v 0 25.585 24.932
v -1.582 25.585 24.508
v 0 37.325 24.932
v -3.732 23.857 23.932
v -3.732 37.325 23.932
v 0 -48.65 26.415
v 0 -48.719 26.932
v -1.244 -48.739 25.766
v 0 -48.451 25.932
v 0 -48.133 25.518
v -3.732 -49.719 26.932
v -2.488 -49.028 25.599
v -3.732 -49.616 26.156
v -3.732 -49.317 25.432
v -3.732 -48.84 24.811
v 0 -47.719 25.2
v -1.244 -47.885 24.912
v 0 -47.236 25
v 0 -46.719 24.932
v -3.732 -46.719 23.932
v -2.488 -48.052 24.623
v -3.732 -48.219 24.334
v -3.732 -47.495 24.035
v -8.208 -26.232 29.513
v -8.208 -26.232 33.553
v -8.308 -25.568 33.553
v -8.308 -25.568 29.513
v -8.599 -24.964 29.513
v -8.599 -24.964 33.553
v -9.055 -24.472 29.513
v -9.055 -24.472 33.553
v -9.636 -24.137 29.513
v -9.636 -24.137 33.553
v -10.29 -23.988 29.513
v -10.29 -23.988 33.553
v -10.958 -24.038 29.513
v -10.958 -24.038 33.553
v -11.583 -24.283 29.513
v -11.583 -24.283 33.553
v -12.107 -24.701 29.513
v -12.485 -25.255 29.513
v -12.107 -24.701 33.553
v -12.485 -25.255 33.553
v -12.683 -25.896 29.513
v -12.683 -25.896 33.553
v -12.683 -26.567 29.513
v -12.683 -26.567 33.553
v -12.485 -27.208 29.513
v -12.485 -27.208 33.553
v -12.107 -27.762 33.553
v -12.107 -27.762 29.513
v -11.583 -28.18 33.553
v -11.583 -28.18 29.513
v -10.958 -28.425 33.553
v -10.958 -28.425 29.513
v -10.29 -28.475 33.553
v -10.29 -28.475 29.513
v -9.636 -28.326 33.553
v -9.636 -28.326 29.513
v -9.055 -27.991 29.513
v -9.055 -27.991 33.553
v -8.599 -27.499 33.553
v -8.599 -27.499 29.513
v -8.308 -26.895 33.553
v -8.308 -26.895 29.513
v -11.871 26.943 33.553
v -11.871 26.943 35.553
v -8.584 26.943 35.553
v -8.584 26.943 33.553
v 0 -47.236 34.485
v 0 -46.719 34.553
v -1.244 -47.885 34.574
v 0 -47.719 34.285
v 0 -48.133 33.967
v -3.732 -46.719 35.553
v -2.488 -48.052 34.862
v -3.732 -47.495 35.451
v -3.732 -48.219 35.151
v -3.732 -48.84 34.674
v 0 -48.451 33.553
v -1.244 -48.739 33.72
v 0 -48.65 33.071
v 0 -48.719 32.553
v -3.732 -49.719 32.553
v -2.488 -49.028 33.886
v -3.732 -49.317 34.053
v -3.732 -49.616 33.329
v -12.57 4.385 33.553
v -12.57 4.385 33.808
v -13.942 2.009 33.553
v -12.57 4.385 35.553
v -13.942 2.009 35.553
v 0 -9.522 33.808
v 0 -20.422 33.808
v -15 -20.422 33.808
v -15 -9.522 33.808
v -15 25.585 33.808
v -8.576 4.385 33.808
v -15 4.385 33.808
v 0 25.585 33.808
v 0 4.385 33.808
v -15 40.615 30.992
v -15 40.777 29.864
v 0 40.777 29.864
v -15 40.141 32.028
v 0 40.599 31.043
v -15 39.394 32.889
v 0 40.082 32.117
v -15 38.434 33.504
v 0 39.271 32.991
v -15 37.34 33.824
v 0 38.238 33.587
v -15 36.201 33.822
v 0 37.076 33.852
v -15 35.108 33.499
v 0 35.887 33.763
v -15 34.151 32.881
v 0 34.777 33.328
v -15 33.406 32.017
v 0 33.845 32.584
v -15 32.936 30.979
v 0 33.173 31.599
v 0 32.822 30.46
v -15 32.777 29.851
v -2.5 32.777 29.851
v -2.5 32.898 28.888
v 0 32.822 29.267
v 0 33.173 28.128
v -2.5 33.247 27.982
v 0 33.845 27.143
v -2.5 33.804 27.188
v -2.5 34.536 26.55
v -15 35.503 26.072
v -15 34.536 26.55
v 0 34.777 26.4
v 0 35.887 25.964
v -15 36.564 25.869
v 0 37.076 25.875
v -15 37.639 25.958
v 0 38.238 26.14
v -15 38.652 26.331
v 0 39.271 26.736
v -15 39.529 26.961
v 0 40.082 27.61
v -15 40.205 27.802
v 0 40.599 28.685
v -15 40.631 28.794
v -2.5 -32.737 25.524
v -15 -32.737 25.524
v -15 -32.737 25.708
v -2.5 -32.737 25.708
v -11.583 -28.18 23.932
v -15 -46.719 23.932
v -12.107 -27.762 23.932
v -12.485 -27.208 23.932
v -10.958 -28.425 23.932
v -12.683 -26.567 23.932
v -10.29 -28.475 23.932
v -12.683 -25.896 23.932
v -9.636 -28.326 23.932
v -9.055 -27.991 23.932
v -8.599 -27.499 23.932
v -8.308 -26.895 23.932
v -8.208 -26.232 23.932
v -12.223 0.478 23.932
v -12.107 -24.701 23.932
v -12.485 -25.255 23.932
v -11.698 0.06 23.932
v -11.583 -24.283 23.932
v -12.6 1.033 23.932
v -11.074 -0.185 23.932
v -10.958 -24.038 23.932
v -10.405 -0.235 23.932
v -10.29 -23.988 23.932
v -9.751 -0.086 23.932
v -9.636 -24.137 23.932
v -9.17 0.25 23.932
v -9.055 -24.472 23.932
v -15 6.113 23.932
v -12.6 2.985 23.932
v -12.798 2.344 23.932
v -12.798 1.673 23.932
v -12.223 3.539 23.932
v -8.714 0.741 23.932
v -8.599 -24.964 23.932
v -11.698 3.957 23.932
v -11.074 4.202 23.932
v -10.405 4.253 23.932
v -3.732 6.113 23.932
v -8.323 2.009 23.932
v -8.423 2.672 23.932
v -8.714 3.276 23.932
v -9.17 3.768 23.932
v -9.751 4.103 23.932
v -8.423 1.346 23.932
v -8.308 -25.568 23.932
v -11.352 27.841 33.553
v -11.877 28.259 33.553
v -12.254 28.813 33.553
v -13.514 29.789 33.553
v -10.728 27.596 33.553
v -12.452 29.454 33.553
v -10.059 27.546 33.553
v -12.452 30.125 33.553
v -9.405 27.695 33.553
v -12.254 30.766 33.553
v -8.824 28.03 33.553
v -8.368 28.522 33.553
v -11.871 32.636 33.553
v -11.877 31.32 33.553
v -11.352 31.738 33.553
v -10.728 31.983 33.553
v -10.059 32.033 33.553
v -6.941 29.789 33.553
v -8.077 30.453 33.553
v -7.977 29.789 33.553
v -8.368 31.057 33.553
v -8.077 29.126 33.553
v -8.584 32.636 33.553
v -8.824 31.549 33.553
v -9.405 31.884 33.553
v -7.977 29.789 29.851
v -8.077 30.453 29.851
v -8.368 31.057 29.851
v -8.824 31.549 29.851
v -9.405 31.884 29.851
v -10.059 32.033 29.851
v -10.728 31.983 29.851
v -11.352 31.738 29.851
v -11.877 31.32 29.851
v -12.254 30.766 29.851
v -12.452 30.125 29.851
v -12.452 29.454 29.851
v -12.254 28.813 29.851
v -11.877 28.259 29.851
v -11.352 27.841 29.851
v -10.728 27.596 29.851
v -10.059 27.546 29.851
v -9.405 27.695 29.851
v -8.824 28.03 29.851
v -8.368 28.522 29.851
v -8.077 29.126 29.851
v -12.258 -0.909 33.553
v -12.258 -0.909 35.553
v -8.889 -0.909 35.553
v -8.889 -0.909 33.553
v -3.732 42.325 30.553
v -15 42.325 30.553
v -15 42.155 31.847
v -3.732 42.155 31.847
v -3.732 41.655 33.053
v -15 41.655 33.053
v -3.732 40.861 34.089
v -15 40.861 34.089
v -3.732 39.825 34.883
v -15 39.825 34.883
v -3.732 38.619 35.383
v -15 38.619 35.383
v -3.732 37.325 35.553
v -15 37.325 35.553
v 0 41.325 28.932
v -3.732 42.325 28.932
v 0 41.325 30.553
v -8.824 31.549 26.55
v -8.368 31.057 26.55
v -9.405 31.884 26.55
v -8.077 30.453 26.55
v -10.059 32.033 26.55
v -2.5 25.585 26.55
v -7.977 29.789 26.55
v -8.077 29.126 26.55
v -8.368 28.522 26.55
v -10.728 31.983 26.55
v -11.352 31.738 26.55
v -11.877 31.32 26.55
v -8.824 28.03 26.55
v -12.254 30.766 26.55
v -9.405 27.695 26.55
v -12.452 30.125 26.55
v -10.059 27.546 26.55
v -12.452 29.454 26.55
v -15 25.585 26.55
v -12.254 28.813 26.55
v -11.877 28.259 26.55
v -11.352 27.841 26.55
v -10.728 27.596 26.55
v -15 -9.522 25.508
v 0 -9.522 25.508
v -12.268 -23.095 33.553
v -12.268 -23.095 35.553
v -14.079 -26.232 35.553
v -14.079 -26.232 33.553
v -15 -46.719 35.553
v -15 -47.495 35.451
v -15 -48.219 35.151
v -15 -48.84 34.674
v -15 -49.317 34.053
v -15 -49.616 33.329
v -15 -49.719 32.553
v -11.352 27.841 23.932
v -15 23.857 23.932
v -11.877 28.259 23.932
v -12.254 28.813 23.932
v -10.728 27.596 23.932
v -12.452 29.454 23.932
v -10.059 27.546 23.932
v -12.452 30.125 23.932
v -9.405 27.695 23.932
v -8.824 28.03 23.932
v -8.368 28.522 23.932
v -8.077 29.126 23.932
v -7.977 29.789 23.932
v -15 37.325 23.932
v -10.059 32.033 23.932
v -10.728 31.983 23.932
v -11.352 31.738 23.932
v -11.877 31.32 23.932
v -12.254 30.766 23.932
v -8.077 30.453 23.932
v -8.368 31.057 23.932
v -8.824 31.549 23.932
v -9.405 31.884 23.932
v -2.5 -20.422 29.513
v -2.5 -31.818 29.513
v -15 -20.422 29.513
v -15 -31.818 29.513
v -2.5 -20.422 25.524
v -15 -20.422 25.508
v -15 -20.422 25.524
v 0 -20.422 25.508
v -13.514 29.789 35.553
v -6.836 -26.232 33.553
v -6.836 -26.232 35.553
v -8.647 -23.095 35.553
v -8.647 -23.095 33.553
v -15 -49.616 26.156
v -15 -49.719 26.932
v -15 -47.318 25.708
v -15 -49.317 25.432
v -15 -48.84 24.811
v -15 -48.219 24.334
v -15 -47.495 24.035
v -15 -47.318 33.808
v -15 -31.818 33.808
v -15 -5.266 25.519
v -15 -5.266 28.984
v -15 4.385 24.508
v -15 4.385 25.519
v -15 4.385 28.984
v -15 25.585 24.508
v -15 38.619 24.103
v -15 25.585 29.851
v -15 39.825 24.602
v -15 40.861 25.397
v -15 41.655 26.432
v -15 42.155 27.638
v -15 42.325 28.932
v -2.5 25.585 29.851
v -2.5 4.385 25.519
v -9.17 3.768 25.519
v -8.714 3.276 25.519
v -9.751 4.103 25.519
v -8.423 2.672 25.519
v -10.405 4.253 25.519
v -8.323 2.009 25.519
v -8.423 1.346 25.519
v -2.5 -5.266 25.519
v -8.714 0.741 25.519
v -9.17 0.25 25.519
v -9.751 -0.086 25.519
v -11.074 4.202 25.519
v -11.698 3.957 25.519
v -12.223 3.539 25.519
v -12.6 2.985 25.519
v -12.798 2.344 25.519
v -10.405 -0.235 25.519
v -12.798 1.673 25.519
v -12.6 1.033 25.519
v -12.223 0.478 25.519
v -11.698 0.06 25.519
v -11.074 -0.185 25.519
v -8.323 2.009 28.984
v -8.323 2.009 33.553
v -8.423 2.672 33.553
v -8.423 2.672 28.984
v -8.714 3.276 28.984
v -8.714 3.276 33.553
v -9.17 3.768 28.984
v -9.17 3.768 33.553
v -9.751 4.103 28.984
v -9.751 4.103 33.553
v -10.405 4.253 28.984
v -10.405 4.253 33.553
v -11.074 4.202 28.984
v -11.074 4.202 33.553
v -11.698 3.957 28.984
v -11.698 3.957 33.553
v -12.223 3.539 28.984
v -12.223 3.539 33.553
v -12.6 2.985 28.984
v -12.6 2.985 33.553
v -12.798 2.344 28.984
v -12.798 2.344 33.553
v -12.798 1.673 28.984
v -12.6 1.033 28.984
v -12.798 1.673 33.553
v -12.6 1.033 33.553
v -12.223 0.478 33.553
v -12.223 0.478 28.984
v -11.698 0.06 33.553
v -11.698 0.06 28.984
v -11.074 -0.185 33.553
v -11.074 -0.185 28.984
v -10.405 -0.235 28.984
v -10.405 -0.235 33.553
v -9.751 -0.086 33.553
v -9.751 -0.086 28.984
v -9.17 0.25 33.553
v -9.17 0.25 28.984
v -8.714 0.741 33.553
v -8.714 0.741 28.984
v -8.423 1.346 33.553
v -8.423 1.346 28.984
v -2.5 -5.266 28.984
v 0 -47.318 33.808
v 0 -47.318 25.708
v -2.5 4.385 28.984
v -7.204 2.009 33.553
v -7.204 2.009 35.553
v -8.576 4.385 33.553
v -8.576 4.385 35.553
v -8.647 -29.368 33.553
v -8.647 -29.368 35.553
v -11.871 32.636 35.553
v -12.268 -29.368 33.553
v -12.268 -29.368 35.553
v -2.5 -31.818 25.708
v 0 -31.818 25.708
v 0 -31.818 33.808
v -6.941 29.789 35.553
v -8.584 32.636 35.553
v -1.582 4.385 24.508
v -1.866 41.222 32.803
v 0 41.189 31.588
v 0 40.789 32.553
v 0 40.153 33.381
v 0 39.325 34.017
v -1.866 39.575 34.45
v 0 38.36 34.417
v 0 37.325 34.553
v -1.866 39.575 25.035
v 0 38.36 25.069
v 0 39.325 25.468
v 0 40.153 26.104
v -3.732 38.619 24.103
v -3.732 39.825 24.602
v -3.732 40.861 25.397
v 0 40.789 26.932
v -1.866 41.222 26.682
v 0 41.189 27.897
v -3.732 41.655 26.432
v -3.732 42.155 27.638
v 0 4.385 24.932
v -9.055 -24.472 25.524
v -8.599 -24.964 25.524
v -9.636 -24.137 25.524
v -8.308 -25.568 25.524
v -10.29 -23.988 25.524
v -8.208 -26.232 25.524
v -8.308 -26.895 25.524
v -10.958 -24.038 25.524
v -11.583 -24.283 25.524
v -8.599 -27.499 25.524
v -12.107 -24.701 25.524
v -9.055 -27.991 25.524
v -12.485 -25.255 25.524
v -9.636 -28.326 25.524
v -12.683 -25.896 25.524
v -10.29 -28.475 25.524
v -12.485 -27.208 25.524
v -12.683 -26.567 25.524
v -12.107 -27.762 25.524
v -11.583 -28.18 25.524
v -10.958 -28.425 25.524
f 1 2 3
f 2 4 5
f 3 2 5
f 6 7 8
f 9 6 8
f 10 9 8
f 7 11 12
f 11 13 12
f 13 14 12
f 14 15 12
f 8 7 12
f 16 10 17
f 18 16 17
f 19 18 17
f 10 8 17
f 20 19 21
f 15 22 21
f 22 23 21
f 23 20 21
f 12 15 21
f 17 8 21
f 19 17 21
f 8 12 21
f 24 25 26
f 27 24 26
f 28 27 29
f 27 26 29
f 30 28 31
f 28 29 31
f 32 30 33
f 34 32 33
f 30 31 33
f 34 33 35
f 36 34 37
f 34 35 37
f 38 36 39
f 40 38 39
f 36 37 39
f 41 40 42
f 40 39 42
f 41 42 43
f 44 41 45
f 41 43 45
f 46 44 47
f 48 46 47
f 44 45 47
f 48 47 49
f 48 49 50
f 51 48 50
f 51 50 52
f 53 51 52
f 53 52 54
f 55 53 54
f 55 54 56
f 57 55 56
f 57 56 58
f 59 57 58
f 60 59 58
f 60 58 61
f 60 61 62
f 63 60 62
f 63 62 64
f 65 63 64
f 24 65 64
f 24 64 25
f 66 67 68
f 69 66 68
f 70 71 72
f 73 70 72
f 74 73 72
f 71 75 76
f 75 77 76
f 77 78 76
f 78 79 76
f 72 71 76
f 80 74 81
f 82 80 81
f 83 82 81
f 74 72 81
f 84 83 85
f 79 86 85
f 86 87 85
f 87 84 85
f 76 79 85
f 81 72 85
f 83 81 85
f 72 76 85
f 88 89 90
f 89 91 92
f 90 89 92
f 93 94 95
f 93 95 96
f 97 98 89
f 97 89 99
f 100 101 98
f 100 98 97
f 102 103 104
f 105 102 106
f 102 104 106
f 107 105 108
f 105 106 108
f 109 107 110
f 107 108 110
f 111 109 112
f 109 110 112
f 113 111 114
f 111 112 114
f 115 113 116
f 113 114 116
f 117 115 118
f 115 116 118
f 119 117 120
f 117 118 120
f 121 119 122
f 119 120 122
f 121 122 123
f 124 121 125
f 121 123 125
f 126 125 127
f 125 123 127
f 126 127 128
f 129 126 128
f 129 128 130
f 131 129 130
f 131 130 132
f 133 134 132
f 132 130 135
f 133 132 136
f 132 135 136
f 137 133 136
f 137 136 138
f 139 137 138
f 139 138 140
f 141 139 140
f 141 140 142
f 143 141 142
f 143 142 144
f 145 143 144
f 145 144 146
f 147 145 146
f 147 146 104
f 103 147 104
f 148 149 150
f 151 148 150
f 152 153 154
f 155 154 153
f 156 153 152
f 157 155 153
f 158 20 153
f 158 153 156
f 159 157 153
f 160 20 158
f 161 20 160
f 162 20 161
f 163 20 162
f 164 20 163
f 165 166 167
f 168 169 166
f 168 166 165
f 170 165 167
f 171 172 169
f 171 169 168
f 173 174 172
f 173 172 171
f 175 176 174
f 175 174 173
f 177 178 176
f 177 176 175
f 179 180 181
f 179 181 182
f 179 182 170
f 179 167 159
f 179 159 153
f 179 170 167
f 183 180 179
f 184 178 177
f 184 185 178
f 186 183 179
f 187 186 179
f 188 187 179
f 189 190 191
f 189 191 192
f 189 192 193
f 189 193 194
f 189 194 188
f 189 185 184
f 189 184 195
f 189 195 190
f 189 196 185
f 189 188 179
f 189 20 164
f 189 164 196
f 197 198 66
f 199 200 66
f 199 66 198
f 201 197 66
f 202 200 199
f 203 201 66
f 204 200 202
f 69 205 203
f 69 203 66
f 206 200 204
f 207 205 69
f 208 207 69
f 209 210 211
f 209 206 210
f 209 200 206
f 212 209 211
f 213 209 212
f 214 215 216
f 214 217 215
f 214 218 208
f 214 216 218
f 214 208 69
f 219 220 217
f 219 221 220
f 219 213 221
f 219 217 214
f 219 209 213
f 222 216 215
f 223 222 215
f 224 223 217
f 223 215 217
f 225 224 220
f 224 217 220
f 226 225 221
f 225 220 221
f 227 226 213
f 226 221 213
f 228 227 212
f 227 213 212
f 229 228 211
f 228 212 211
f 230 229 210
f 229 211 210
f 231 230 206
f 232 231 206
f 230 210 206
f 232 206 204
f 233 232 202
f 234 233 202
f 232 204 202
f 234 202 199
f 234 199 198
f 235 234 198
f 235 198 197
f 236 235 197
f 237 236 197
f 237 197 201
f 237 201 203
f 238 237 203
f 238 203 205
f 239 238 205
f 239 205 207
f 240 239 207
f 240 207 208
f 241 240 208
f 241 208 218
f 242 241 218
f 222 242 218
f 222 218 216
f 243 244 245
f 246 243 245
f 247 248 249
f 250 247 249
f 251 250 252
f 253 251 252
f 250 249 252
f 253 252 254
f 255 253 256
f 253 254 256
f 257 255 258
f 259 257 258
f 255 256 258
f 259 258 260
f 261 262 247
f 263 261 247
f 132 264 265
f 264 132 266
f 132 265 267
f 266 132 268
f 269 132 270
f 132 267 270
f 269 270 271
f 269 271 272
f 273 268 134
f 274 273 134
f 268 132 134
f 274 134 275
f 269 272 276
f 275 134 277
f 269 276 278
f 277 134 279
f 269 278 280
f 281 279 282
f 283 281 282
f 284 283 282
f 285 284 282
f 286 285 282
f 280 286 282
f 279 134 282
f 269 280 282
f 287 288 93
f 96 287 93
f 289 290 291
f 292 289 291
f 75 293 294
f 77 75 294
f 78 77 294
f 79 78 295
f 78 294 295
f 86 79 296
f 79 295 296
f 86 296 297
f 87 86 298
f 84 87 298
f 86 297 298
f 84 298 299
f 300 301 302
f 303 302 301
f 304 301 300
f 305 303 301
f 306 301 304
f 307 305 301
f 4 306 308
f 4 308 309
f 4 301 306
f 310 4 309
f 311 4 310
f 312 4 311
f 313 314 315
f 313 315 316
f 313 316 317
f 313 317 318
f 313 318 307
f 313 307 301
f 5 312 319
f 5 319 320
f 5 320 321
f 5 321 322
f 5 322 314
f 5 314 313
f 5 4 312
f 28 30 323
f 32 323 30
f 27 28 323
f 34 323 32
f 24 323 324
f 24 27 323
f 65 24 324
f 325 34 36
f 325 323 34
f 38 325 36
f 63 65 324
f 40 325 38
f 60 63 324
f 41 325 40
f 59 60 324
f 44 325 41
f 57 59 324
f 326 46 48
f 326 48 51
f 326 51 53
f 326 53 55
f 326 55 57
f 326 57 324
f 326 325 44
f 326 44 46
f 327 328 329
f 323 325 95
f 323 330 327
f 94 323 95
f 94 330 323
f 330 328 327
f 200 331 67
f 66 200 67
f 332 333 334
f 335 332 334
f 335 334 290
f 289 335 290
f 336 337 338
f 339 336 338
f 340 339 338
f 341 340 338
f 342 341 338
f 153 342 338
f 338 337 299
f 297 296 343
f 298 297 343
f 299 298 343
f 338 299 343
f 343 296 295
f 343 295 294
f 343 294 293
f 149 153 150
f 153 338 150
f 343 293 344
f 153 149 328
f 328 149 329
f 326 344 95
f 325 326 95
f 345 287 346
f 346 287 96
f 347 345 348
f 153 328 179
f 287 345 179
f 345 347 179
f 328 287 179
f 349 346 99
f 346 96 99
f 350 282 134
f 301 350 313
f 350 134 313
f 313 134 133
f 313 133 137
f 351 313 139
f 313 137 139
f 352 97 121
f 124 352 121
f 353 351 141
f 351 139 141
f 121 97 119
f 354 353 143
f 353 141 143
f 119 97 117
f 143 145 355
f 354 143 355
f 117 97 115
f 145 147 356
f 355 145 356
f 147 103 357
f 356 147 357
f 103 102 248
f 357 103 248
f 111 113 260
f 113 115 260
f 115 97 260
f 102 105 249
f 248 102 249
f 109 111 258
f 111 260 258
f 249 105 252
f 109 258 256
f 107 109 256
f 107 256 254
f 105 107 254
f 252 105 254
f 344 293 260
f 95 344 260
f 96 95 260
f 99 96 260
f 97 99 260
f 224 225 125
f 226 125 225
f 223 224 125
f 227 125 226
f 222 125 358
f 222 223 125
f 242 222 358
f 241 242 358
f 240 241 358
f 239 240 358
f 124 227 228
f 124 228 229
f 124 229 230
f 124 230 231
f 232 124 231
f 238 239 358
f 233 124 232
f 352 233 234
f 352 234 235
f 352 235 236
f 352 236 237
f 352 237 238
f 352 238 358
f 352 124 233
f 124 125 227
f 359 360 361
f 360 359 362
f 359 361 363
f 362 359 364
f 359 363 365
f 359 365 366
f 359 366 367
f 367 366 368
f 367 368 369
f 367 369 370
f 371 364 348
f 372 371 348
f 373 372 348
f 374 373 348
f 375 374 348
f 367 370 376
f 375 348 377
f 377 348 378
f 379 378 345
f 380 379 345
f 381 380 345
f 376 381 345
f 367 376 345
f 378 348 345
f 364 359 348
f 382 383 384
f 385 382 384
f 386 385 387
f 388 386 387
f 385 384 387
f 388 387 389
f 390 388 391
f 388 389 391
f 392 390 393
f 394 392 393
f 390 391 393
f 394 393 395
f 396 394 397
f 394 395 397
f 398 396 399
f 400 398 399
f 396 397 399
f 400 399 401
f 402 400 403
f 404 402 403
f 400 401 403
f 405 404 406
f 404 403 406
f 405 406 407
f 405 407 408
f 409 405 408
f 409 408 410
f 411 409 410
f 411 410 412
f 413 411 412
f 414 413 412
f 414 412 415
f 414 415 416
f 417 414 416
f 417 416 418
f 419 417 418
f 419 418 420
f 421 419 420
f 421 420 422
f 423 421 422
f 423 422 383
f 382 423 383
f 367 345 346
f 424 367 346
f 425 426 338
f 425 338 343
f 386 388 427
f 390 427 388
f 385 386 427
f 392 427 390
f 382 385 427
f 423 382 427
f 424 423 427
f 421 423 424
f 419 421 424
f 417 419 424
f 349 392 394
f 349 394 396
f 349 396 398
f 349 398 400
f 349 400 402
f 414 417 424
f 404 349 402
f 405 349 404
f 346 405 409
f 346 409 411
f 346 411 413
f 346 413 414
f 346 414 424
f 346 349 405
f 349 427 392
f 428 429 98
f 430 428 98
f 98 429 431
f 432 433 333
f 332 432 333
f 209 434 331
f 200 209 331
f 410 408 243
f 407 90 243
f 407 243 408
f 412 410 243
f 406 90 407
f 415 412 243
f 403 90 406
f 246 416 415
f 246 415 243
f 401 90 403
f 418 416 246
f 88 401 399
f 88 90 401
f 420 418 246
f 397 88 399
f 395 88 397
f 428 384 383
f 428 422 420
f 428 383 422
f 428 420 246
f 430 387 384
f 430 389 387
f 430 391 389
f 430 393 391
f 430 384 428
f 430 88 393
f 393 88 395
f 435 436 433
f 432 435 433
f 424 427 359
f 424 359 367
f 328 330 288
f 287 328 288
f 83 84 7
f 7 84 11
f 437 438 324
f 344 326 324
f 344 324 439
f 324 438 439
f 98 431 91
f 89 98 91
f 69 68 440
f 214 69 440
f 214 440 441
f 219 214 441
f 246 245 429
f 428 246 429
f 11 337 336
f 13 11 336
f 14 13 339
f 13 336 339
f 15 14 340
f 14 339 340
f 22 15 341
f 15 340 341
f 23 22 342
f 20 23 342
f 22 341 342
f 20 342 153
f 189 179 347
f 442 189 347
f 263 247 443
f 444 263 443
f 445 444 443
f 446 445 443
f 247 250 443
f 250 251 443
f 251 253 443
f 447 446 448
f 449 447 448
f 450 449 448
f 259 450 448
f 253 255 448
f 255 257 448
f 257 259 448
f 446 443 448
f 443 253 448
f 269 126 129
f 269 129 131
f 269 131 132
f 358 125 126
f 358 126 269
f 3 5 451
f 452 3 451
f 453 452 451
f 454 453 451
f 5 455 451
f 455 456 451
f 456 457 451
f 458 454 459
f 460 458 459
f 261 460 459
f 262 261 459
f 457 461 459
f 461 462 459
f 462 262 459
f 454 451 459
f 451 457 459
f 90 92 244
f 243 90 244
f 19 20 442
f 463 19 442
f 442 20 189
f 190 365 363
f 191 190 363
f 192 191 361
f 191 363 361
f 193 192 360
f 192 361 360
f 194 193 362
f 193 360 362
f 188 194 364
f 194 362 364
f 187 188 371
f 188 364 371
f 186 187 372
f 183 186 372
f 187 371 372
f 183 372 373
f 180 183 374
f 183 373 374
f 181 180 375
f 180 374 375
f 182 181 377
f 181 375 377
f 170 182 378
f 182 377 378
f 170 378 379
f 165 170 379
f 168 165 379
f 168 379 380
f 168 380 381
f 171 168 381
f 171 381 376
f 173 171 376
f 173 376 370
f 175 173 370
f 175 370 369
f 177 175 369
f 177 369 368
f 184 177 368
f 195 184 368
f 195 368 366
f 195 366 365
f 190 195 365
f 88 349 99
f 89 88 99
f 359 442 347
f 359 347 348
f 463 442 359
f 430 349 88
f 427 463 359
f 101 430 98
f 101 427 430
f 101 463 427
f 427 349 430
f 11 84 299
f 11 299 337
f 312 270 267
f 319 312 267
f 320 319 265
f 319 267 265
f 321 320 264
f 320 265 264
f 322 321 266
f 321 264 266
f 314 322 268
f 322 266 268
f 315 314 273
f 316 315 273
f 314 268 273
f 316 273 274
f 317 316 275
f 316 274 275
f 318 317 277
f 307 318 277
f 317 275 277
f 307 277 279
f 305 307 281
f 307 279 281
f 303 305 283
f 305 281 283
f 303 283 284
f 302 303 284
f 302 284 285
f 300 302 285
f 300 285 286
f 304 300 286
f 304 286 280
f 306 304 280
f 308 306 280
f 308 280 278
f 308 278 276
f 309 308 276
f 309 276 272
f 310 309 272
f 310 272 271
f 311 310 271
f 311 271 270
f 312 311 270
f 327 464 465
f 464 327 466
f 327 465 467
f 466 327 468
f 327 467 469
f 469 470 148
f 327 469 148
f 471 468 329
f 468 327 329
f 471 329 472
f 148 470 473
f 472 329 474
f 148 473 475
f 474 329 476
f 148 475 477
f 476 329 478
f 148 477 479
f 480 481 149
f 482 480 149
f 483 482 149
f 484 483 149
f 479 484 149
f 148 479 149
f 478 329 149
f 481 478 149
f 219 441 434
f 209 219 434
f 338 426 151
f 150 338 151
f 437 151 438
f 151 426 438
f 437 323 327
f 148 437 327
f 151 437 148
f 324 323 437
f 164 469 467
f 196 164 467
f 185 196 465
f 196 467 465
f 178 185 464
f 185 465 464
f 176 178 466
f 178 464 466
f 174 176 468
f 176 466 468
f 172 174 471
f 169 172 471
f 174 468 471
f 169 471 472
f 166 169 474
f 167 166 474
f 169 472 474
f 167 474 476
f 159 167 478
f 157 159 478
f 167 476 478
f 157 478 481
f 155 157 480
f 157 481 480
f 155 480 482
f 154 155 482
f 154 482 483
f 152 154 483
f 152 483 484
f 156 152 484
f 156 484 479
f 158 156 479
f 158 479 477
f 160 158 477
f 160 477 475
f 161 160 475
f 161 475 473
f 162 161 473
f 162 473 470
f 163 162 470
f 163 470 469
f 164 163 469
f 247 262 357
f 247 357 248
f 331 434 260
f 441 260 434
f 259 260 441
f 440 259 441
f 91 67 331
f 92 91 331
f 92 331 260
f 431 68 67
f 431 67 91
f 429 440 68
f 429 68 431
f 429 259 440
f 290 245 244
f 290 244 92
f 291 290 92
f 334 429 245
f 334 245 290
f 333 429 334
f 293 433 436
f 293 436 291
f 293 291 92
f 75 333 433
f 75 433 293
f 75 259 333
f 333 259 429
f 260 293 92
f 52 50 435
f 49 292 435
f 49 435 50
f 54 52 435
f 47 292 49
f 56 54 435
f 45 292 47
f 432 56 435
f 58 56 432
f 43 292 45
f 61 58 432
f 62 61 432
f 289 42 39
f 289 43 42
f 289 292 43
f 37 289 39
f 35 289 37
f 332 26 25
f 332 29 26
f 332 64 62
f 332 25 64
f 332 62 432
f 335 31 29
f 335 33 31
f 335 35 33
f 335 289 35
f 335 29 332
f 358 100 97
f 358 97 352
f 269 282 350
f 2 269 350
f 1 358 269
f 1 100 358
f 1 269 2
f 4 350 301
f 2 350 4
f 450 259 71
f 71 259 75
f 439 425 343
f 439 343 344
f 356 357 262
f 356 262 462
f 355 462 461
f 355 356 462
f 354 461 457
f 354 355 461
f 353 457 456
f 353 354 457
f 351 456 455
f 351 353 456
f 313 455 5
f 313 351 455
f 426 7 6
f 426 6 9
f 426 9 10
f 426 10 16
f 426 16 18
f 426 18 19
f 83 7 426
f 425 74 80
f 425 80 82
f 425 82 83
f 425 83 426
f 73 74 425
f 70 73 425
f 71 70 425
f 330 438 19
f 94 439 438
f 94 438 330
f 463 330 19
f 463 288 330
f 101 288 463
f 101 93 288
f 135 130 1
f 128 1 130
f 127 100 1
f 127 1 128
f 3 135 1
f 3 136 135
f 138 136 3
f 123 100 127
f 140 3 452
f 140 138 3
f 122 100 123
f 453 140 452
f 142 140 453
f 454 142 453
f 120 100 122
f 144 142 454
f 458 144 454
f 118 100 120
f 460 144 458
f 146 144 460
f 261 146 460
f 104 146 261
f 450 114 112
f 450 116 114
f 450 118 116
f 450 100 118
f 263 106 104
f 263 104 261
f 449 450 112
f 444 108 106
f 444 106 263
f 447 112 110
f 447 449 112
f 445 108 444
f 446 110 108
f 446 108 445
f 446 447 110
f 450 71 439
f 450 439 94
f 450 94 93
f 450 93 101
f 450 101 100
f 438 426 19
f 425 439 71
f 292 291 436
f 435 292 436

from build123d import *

# Parameters (mm, degrees)
F0_W     = 15.5
F0_H     = 8.1
F0_W_2   = 10.9
F0_H_2   = 8.3
F0_R     = 4
F1_DEPTH = 15
F2_W     = 11.035934
F2_H     = 3.300466
F2_W_2   = 12.273613
F2_H_2   = 3.464567
F2_W_3   = 14.223677
F2_H_3   = 3.989566
F3_DEPTH = 12.5
F4_R     = 2.25
F5_DEPTH = 25
F6_DEPTH = 2
F7_R     = 5
F8_R     = 3
F9_SIZE2 = 3.732051
F9_SIZE  = 1


with BuildPart() as f1:
    # F0 (on Right) → F1 (new body)
    with BuildSketch(Plane.YZ):
        Polygon((42.32502, 23.932349), (42.32502, 35.553029), (-49.718533, 35.553029), (-49.718533, 23.932349), (4.384954, 23.932349), (4.384954, 24.508461), (4.384954, 33.808461), (25.584954, 33.808461), (25.584954, 24.508461), (25.584954, 23.932349), align=None)
        with Locations((-39.568292, 29.758461)):
            Rectangle(F0_W, F0_H, mode=Mode.SUBTRACT)
        with Locations((-14.972494, 29.658461)):
            Rectangle(F0_W_2, F0_H_2, mode=Mode.SUBTRACT)
        with Locations((36.776925, 29.86361)):
            Circle(F0_R, mode=Mode.SUBTRACT)
        Polygon((4.384954, 24.508461), (4.384954, 23.932349), (6.113291, 23.932349), align=None)
        Polygon((23.856617, 23.932349), (25.584954, 23.932349), (25.584954, 24.508461), align=None)
    extrude(amount=-F1_DEPTH)

    # F2 (on face) → F3 (cut)
    with BuildSketch(Plane(origin=(-15, 0, 0), x_dir=(0, -1, 0), z_dir=(-1, 0, 0))):
        with Locations((-29.337391, 28.200673)):
            Rectangle(F2_W, F2_H)
        with Locations((-0.870865, 27.251326)):
            Rectangle(F2_W_2, F2_H_2)
        with Locations((25.624747, 27.518563)):
            Rectangle(F2_W_3, F2_H_3)
    extrude(amount=-F3_DEPTH, mode=Mode.SUBTRACT)

    # F4 (on face) → F5 (cut)
    with BuildSketch(Plane.XY.offset(35.553029)):
        with Locations((-10.227251, 29.789448)):
            Circle(F4_R)
        with Locations((-10.573186, 2.008814)):
            Circle(F4_R)
        with Locations((-10.457753, -26.231565)):
            Circle(F4_R)
    extrude(amount=-F5_DEPTH, mode=Mode.SUBTRACT)

    # F4 (on face) → F6 (cut)
    with BuildSketch(Plane.XY.offset(35.553029)):
        Polygon((-11.870602, 26.94308), (-8.5839, 26.94308), (-6.940549, 29.789448), (-8.5839, 32.635815), (-11.870602, 32.635815), (-13.513953, 29.789448), align=None)
        with Locations((-10.227251, 29.789448)):
            Circle(F4_R, mode=Mode.SUBTRACT)
        Polygon((-12.268482, -29.367838), (-8.647025, -29.367838), (-6.836297, -26.231565), (-8.647025, -23.095291), (-12.268482, -23.095291), (-14.07921, -26.231565), align=None)
        with Locations((-10.457753, -26.231565)):
            Circle(F4_R, mode=Mode.SUBTRACT)
        Polygon((-8.576097, 4.384954), (-12.570275, 4.384954), (-13.94214, 2.008814), (-12.257663, -0.908786), (-8.888709, -0.908786), (-7.204232, 2.008814), align=None)
        with Locations((-10.573186, 2.008814)):
            Circle(F4_R, mode=Mode.SUBTRACT)
    extrude(amount=-F6_DEPTH, mode=Mode.SUBTRACT)

    # F7
    f7_edges = [f1.edges().sort_by_distance(p)[0] for p in [
        (-7.5, 42.32502, 23.932349),
        (-7.5, 42.32502, 35.553029),
    ]]
    fillet(f7_edges, radius=F7_R)

    # F8
    f8_edges = [f1.edges().sort_by_distance(p)[0] for p in [
        (-7.5, -49.718533, 35.553029),
        (-7.5, -49.718533, 23.932349),
    ]]
    fillet(f8_edges, radius=F8_R)

    # F9
    f9_edges = [f1.edges().sort_by_distance(p)[0] for p in [
        (0, -4.696756, 35.553029),
    ]]
    chamfer(f9_edges, length=F9_SIZE, length2=F9_SIZE2)


solid = f1.part
